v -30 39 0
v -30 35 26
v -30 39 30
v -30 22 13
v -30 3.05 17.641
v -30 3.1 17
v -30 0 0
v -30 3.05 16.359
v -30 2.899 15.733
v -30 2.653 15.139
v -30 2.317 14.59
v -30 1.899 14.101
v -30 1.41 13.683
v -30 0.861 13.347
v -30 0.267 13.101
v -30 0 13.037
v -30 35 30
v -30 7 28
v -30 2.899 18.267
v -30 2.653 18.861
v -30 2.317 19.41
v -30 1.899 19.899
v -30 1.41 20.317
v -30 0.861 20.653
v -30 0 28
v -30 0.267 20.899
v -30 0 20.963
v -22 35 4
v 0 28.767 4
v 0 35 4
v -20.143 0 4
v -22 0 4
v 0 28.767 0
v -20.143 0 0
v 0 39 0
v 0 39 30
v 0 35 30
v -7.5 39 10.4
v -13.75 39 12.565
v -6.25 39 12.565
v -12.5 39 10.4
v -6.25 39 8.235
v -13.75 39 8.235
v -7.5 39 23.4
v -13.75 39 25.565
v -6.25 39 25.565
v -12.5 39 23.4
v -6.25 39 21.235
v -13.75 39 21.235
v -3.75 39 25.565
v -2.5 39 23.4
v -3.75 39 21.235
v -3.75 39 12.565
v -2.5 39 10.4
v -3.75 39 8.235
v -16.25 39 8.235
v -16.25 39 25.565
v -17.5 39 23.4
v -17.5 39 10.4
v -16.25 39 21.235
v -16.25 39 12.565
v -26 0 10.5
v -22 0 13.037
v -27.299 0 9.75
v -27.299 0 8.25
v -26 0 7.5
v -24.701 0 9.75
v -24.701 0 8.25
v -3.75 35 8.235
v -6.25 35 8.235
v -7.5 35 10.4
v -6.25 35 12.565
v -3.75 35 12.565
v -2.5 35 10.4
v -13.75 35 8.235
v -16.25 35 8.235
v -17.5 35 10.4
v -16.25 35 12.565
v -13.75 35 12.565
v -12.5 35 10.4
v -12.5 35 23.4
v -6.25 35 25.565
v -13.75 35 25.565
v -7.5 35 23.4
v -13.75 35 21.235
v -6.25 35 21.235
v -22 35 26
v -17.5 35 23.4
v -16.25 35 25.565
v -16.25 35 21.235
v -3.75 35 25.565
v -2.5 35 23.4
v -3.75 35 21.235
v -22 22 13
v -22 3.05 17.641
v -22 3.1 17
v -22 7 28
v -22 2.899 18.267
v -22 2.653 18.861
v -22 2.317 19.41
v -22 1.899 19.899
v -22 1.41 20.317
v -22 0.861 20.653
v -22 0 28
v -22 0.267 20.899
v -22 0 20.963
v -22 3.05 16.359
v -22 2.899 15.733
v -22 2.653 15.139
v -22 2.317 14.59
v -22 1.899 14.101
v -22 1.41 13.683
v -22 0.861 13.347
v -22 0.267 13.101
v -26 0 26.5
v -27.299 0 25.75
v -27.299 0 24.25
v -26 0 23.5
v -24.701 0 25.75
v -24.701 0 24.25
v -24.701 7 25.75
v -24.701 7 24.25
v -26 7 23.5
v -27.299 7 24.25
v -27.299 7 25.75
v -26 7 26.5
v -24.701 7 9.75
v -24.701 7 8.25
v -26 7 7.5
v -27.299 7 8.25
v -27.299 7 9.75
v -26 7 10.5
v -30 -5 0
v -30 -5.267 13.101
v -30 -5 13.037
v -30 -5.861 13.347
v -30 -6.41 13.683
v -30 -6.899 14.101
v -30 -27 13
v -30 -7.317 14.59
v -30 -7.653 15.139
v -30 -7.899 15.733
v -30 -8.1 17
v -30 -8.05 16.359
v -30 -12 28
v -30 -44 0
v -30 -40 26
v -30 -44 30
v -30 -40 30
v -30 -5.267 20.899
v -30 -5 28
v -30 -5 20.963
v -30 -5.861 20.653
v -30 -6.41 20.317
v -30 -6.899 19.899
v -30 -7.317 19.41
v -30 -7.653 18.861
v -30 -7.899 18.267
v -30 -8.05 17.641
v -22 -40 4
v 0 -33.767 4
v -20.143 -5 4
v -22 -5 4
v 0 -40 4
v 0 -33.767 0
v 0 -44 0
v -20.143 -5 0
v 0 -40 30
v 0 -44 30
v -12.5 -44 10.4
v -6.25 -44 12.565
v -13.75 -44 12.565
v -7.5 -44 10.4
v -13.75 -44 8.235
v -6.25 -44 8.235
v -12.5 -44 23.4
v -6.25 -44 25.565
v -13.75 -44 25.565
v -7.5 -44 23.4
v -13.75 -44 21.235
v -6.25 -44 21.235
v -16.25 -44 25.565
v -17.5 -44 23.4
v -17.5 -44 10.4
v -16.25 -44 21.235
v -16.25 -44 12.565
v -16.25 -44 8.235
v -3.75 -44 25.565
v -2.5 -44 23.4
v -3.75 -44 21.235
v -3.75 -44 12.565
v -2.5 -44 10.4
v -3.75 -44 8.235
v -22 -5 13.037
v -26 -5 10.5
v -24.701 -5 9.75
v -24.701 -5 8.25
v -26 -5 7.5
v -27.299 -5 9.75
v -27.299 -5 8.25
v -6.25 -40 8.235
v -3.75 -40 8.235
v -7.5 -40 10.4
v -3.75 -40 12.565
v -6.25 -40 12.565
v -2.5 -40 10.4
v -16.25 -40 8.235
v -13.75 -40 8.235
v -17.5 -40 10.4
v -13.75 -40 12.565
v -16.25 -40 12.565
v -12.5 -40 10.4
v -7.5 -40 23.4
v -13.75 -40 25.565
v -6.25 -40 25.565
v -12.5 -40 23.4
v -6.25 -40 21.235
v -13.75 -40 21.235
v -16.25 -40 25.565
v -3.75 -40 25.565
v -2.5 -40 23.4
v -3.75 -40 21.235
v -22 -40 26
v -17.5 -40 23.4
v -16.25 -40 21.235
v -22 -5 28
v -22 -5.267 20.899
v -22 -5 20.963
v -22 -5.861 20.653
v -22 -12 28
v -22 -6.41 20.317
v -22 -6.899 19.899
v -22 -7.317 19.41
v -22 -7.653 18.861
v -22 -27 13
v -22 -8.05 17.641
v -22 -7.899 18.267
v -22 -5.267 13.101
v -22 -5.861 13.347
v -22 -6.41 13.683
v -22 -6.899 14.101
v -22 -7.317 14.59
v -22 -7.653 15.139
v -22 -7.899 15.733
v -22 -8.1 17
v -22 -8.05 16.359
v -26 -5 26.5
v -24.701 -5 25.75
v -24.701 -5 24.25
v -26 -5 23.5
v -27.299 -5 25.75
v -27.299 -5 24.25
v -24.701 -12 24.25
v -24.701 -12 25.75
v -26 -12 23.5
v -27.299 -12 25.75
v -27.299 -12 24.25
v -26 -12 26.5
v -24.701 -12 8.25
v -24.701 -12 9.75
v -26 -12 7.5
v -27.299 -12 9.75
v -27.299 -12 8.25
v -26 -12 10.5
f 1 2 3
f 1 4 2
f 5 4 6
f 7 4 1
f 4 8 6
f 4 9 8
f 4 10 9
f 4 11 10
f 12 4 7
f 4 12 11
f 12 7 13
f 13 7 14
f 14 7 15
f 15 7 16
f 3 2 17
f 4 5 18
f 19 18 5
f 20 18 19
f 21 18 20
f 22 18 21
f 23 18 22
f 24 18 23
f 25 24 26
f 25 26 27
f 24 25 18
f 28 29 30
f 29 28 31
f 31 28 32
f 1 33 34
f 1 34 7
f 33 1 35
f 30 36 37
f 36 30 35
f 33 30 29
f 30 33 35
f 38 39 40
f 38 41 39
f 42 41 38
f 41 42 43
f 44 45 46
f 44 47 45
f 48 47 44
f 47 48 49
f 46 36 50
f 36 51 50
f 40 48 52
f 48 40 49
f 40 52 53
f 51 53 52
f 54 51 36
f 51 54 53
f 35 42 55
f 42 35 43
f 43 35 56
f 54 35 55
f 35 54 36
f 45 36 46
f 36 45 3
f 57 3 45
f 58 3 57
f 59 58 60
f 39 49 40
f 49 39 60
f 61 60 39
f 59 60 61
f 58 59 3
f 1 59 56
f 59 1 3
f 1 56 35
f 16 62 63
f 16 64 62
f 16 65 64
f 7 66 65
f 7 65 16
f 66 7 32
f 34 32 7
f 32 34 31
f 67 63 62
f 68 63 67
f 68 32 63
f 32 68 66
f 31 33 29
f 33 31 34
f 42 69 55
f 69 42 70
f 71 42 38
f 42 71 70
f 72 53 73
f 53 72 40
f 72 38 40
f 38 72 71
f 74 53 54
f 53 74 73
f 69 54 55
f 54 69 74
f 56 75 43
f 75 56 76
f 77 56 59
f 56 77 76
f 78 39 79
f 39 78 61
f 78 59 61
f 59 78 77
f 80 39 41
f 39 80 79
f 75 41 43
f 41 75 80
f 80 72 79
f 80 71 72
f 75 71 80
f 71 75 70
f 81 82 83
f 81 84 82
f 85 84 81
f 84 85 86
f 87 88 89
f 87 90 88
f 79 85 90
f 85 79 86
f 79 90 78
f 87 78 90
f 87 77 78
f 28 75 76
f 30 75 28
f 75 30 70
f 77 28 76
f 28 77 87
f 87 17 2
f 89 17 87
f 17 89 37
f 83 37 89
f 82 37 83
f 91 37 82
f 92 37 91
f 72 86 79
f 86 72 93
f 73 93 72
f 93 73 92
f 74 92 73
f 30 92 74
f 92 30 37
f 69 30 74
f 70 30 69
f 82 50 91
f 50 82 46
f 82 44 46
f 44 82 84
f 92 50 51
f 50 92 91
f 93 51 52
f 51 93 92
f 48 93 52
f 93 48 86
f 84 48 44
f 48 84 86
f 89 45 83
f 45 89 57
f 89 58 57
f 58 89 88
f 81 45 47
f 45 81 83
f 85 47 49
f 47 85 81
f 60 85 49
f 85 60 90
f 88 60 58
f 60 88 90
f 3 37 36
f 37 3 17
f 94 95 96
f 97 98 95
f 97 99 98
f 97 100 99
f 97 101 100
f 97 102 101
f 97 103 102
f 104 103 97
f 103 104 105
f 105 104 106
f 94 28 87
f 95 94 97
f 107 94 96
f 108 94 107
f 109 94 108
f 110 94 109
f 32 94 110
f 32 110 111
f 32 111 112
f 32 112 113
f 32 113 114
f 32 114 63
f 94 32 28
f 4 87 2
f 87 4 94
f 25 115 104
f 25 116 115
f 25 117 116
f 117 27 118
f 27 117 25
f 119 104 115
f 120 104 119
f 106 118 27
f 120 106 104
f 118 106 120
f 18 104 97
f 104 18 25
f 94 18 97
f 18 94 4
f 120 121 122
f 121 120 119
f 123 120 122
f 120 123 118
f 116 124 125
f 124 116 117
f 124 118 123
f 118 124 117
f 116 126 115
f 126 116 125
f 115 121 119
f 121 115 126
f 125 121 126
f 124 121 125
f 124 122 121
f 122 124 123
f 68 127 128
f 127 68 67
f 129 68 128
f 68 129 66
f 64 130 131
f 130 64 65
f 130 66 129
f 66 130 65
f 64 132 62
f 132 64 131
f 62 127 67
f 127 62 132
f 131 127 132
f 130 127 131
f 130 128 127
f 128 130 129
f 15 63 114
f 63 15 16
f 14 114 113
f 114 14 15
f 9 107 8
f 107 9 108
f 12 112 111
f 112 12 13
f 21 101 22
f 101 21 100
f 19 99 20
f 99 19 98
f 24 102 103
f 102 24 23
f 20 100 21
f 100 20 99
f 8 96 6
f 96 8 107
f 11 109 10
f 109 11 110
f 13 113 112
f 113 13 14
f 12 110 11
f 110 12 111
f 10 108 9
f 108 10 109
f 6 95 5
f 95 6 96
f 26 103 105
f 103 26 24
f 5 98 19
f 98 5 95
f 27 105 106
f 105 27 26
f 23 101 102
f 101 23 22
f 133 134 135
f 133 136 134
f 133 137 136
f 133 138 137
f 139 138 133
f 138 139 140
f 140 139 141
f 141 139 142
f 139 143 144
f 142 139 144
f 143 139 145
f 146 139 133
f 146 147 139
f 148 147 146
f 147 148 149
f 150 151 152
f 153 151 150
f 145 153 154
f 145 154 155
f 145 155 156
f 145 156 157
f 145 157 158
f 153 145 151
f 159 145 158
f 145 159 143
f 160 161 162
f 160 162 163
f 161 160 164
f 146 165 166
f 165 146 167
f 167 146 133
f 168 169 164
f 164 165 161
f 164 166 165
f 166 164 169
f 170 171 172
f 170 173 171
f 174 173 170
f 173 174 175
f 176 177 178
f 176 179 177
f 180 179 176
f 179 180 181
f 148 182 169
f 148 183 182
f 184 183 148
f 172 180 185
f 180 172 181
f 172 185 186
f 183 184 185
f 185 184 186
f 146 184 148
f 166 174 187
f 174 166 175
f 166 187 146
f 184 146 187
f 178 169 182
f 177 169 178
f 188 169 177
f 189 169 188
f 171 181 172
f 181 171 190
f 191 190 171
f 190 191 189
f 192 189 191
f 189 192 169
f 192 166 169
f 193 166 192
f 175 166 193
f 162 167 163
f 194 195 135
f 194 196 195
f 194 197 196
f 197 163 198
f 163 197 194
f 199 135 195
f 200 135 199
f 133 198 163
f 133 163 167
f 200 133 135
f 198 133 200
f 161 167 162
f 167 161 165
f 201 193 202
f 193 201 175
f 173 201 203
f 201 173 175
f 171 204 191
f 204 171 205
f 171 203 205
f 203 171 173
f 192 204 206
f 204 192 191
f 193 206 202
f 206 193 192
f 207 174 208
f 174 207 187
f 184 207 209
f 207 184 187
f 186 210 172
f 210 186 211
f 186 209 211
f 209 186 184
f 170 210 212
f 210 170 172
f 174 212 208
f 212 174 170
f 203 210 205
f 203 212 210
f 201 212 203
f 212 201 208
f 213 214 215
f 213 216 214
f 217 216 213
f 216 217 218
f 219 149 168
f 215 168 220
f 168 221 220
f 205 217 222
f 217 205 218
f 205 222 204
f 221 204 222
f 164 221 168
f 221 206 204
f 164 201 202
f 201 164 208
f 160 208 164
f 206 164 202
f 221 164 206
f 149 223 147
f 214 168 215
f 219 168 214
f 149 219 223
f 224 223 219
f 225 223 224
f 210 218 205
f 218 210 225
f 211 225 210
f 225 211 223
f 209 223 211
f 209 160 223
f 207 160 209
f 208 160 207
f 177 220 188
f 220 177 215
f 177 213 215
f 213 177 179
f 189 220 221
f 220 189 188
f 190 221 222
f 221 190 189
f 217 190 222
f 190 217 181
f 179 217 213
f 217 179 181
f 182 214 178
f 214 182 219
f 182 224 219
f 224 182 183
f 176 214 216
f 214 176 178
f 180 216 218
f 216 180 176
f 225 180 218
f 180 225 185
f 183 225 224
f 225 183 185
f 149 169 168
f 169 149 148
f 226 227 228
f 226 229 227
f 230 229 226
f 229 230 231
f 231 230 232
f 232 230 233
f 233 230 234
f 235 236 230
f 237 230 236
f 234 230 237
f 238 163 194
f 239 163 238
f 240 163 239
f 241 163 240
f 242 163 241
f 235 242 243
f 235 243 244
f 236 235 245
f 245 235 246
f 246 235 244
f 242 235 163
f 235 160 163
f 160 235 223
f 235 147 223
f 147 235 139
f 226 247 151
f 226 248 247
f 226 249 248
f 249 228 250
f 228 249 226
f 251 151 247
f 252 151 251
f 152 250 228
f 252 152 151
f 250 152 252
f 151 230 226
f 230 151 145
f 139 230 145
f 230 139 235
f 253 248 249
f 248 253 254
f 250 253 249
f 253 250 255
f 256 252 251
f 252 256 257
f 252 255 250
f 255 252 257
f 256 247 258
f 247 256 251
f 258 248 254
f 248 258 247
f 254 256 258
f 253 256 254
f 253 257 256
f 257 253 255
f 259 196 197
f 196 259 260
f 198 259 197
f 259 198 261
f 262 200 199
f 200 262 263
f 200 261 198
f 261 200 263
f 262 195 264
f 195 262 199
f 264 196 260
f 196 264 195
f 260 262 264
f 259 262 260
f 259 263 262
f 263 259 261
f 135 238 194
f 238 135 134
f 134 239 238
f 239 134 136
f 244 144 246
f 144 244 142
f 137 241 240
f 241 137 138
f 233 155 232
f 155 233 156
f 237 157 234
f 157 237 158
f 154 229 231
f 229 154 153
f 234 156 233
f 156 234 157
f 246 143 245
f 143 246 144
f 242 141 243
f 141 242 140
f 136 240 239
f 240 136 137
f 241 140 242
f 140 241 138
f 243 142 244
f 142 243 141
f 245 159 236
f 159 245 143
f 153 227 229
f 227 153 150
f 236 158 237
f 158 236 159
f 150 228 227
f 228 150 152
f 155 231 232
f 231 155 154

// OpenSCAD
// file: ../libs/utils/build_plate.scad
// Minimal build plate helper for browser customizer builds.
module build_plate(build_plate_selector=0, build_plate_manual_x=100, build_plate_manual_y=100) {
  // intentionally no-op in browser preview
}
// file: ../libs/obiscad/attach.scad
//---------------------------------------------------------------
//-- Openscad Attachment library
//-- Attach parts easily. Make your designs more reusable and clean
//---------------------------------------------------------------
//-- This is a component of the obiscad opescad tools by Obijuan
//-- (C) Juan Gonzalez-Gomez (Obijuan)
//-- Sep-2012
//---------------------------------------------------------------
//-- Released under the GPL license
//---------------------------------------------------------------

use <vector.scad>

//--------------------------------------------------------------------
//-- Draw a connector
//-- A connector is defined a 3-tuple that consist of a point
//--- (the attachment point), and axis (the attachment axis) and
//--- an angle the connected part should be rotate around the 
//--  attachment axis
//--
//--- Input parameters:
//--
//--  Connector c = [p , n, ang] where:
//--
//--     p : The attachment point
//--     v : The attachment axis
//--   ang : the angle
//--------------------------------------------------------------------
module connector(c)
{
  //-- Get the three components from the connector
  p = c[0];
  v = c[1];
  ang = c[2];

  //-- Draw the attachment poing
  color("Gray") point(p);

  //-- Draw the attachment axis vector (with a mark)
  translate(p)
    rotate(a=ang, v=v)
    color("Gray") vector(unitv(v)*6, l_arrow=2, mark=true);
}


//-------------------------------------------------------------------------
//--  ATTACH OPERATOR
//--  This operator applies the necesary transformations to the 
//--  child (attachable part) so that it is attached to the main part
//--  
//--  Parameters
//--    a -> Connector of the main part
//--    b -> Connector of the attachable part
//-------------------------------------------------------------------------
module attach(a,b)
{
  //-- Get the data from the connectors
  pos1 = a[0];  //-- Attachment point. Main part
  v    = a[1];  //-- Attachment axis. Main part
  roll = a[2];  //-- Rolling angle
  
  pos2 = b[0];  //-- Attachment point. Attachable part
  vref = b[1];  //-- Atachment axis. Attachable part
                //-- The rolling angle of the attachable part is not used

  //-------- Calculations for the "orientate operator"------
  //-- Calculate the rotation axis
  raxis = cross(vref,v);
    
  //-- Calculate the angle between the vectors
  ang = anglev(vref,v);
  //--------------------------------------------------------.-

  //-- Apply the transformations to the child ---------------------------

  //-- Place the attachable part on the main part attachment point
  translate(pos1)
    //-- Orientate operator. Apply the orientation so that
    //-- both attachment axis are paralell. Also apply the roll angle
    rotate(a=roll, v=v)  rotate(a=ang, v=raxis)
      //-- Attachable part to the origin
      translate(-pos2)
	child(0); 
}


//--------------------------------------------------------------------
//---   An example of the attach operator
//---  
//---  There are two parts: the main body and an arm
//---  They both are cubes (for simplicity)
//---
//--   In the main body there are 2 connectors defined, so that
//--  the arm can be attached to any of them (or both if you like)
//------------------------------------------------------------------

//-- In the debug mode the connectors and additional information
//-- are shown
debug=true;

//-- Define the Main part: A cube
//-- Two attachment points are defined: one on the top, another in the
//--- left side
size = [10,10,10];

//-- Connectors defined:

//--     Att. point       Att. Axis  Roll
c1 = [ [0,0,size[2]/2],  [0,0,1],     20];  //-- Connector on the top
c2 = [ [-size[0]/2,0,0], [-1,0,0],    90];  //-- Connector on the left


//-- Draw the main part along with the connectors (for debugging)
cube(size,center=true);

//-- In debug mode: Draw the main part connectors!
if (debug) {
  connector(c1);
  connector(c2);
}

//-- Define the Attachable part. It is another cube, with one connector
asize = [5,20,3];
a = [ [0,asize[1]/2-3,-asize[2]/2], [0,0,1], 0  ];


//-- Do the attach!
//-- Just change c1 by c2 to attach the part to the other 
//-- connector. Super-easy!! :-)
//-- Modify the c1 and c2 roll angle for rotating the attachable
//--  part to the desired orientation
attach(c1,a)
  //-- This is the attachable part! 
  union() {
    cube(asize,center=true);  //-- The part

    //-- In debug mode show additional info:
    if (debug) {
      frame(l=10);    //-- The part frame of reference.
      connector(a);   //-- Show the part connector
    }
  };

  
// file: ../libs/build_plate.scad
//use this to include a build plate visualization in your openSCAD scripts. Very useful for things designed to be edited in Makerbot Customizer

//to use, either include or use <utils/build_plate.scad>

//then just call build_plate(); with the following arguments (also, you have to have a real object in your scene for this to render)

//putting 0 as the first argument will give you a Replicator 2 build plate
//putting 1 as the first argument will give you a Replicator 1 build plate
//putting 2 as the first argument will give you a Thingomatic build plate
//putting 3 as the first argument will give you a manually adjustable build plate (note: if you use this option, you need to specify your build plates X length (in mm) as the second argument and the Y length (in mm) as the third argument. eg. build_plate(3,150,120);)

/*

to give your user control of which build plate they see in Customizer, include the following code:

use <utils/build_plate.scad>

//for display only, doesn't contribute to final object
build_plate_selector = 0; //[0:Replicator 2,1: Replicator,2:Thingomatic,3:Manual]
//when Build Plate Selector is set to "manual" this controls the build plate x dimension
build_plate_manual_x = 100; //[100:400]
//when Build Plate Selector is set to "manual" this controls the build plate y dimension
build_plate_manual_y = 100; //[100:400]

build_plate(build_plate_selector,build_plate_manual_x,build_plate_manual_y);

*/




//to see how this works, uncomment the following code

//build_plate_selector = 0; //[0:Replicator 2,1: Replicator,2:Thingomatic,3:Manual]
//build_plate_manual_x = 100; //[100:400]
//build_plate_manual_y = 100; //[100:400]
//
//build_plate(build_plate_selector,build_plate_manual_x,build_plate_manual_y);
//
//cube(5);


module build_plate(bp,manX,manY){

		translate([0,0,-.52]){
			if(bp == 0){
				%cube([285,153,1],center = true);
			}
			if(bp == 1){
				%cube([225,145,1],center = true);
			}
			if(bp == 2){
				%cube([120,120,1],center = true);
			}
			if(bp == 3){
				%cube([manX,manY,1],center = true);
			}
		
		}
		translate([0,0,-.5]){
			if(bp == 0){
				for(i = [-14:14]){
					translate([i*10,0,0])
					%cube([.5,153,1.01],center = true);
				}
				for(i = [-7:7]){
					translate([0,i*10,0])
					%cube([285,.5,1.01],center = true);
				}	
			}
			if(bp == 1){
				for(i = [-11:11]){
					translate([i*10,0,0])
						%cube([.5,145,1.01],center = true);
				}
				for(i = [-7:7]){
					translate([0,i*10,0])
						%cube([225,.5,1.01],center = true);
				}
			}
			if(bp == 2){
				for(i = [-6:6]){
					translate([i*10,0,0])
						%cube([.5,120,1.01],center = true);
				}
				for(i = [-6:6]){
					translate([0,i*10,0])
						%cube([120,.5,1.01],center = true);
				}
			}
			if(bp == 3){
				for(i = [-(floor(manX/20)):floor(manX/20)]){
					translate([i*10,0,0])
						%cube([.5,manY,1.01],center = true);
				}
				for(i = [-(floor(manY/20)):floor(manY/20)]){
					translate([0,i*10,0])
						%cube([manX,.5,1.01],center = true);
				}
			}
		}
}
// file: ../libs/obiscad/bcube.scad
//------------------------------------------------------------------------------
//  Bevel edge cube.
//  (c) Juan Gonzalez-Gomez (Obijuan), Sep-2012
//------------------------------------------------------------------------------

//----------------- IMPLEMENTATION USING THE MINKOWSKI OPERATOR ----------------

//------------------------------------------------------------------------------
//-- Bevel Cube main function
//-- Parameters:
//--   * Size:  Cube size
//--   * cr : Corner radius (if cr==0, a standar cube is built)
//--   * cres:  Corner resolution (in points). cres=0 means flat corners
//------------------------------------------------------------------------------
module bcube(size,cr=0,cres=0)
{
  //-- Internal cube size
  bsize = size - 2*[cr,cr,0];

  //-- Get the (x,y) coorner coordinates in the 1st cuadrant
  x = bsize[0]/2;
  y = bsize[1]/2;

  //-- A corner radius of 0 means a standar cube!
  if (cr==0)
    cube(bsize,center=true);
  else {

      
      //-- The height of minkowski object is double. So
      //-- we sould scale by 0.5
      scale([1,1,0.5])

      //-- This translation is for centering the minkowski objet
      translate([-x, -y,0])

      //-- Built the  beveled cube with minkowski
      minkowski() {

        //-- Internal cube
        cube(bsize,center=true);

        //-- Cylinder in the corner (1st cuadrant)
        translate([x,y, 0])
          cylinder(r=cr, h=bsize[2],center=true, $fn=4*(cres+1));
      }
  }

}


//-- Examples of use of the bcube() module

//-- Standar cube
translate([-15,15,0])
bcube([20,20,10]);

//-- Beveled cube (0 point resolution)
translate([15,15,0])
  bcube([20,20,10],cr=4);

//-- Beveled cube (1 point resolution)
translate([-15,-15,0])
  bcube([20,20,10],cr=4, cres=1);

//-- Beveled cube (4 points resolution)
translate([15,-15,0])
  bcube([20,20,10],cr=4, cres=4);
// main file
// Cyclone PCB Factory: a 3D printable CNC machine for PCB manufacture
// Created by Carlosgs (http://carlosgs.es)
// License: Attribution - Share Alike - Creative Commons (http://creativecommons.org/licenses/by-sa/3.0/)

use <../libs/obiscad/bcube.scad>
use <../libs/obiscad/bevel.scad>
use <../libs/build_plate.scad>


module Y_rod_idler(show_printbed = 0) {

motor_stand_thickness = 5;

bearing_diameter = 22.4;
M8_rod_diam = 8.2;

smooth_rod_margin = 1;

smooth_rod_screw_sep = 8;
smooth_rod_screw_diam = 3;
smooth_rod_screw_len = 7;

frame_thickness = 4;
bottom_thickness = 4;
base_screw_diameter = 5;

Y_rod_height = 40;
Y_rod_dist_from_wall = 15;

Y_rod_support_lenght = Y_rod_dist_from_wall+smooth_rod_screw_sep+smooth_rod_screw_diam;

frame_width = 30;
frame_height = Y_rod_height-smooth_rod_margin;
wall_thickness = 5;

if(show_printbed) {
//for display only, doesn't contribute to final object
translate([frame_width/2,frame_height/2,0]) build_plate(3,110,140);
}

union() {
  // --------- Main frame --------- //  
  difference() {
  translate([frame_width/2,frame_height/2,frame_thickness/2])
    cube([frame_width,frame_height,frame_thickness],center=true);
  rotate([0,0,35]) cube([33,frame_height*10,frame_thickness*10],center=true);

  } // End of difference() command


// --------- Step with screws in the base --------- //  

  difference() {
  translate([0,frame_height-bottom_thickness,frame_thickness/2])
    cube([frame_width,bottom_thickness,Y_rod_support_lenght/2],center=false);
  // --------- Screws in the base --------- //
  rotate([90,0,0]) translate([frame_width/3,Y_rod_support_lenght/2.5,-frame_height]) {
    translate([-5,0,0])
      cylinder(r=base_screw_diameter/2,h=2*smooth_rod_screw_len,center=true,$fn=6);
    translate([5,0,0])
      cylinder(r=base_screw_diameter/2,h=2*smooth_rod_screw_len,center=true,$fn=6);
  }

  } // End of difference() command
  //Extra 2 screws @yopero
  difference() {
  translate([0,frame_height-bottom_thickness,frame_thickness/2+13])
    cube([frame_width,bottom_thickness,Y_rod_support_lenght/2+2],center=false);
  // --------- Screws in the base --------- //
  rotate([90,0,0]) translate([frame_width/3,Y_rod_support_lenght/2.5,-frame_height]) {
    translate([-5,13,0])
      cylinder(r=base_screw_diameter/2,h=2*smooth_rod_screw_len,center=true,$fn=6);
    translate([5,13,0])
      cylinder(r=base_screw_diameter/2,h=2*smooth_rod_screw_len,center=true,$fn=6);
  }

  } // End of difference() command

// --------- Bevel base supports --------- //
translate([frame_width-frame_thickness,frame_height,frame_thickness-0.5])
  rotate([90,0,-90])
    bconcave_corner(cr=Y_rod_support_lenght-0.5, cres=0, l=frame_thickness*2, th=0.5, ext_corner=true);


// --------- Bevel Y rod support --------- //
translate([frame_width-frame_thickness,frame_height,frame_thickness-2])
  translate([0,-Y_rod_height+smooth_rod_margin,0]) {
    difference() {
      rotate([90,0,90]) // Bevel
        bconcave_corner(cr=Y_rod_support_lenght-smooth_rod_screw_len, cres=0, l=frame_thickness*2, th=smooth_rod_screw_len, ext_corner=true);

      translate([0,-smooth_rod_margin,Y_rod_dist_from_wall]) rotate([0,90,0]) {
        cylinder(r=M8_rod_diam/2,h=10*frame_thickness,center=true,$fn=40);
        // Screws
        rotate([90,0,0]) {
          translate([-smooth_rod_screw_sep,0,-1])
            cylinder(r=smooth_rod_screw_diam/2,h=2*smooth_rod_screw_len,center=true,$fn=6);
          translate([smooth_rod_screw_sep,0,-1])
            cylinder(r=smooth_rod_screw_diam/2,h=2*smooth_rod_screw_len,center=true,$fn=6);
        }
      }
  }
  }

} // End of union() command

}

module base_screws(){


}
//Y_rod_idler(show_printbed = 1);
scale([-1,1,1]) Y_rod_idler(show_printbed = 1);
translate([0,-5,0])
rotate([180,0,0])
mirror([0,0,1]){
   scale([-1,1,1]) Y_rod_idler(show_printbed = 0);
}
